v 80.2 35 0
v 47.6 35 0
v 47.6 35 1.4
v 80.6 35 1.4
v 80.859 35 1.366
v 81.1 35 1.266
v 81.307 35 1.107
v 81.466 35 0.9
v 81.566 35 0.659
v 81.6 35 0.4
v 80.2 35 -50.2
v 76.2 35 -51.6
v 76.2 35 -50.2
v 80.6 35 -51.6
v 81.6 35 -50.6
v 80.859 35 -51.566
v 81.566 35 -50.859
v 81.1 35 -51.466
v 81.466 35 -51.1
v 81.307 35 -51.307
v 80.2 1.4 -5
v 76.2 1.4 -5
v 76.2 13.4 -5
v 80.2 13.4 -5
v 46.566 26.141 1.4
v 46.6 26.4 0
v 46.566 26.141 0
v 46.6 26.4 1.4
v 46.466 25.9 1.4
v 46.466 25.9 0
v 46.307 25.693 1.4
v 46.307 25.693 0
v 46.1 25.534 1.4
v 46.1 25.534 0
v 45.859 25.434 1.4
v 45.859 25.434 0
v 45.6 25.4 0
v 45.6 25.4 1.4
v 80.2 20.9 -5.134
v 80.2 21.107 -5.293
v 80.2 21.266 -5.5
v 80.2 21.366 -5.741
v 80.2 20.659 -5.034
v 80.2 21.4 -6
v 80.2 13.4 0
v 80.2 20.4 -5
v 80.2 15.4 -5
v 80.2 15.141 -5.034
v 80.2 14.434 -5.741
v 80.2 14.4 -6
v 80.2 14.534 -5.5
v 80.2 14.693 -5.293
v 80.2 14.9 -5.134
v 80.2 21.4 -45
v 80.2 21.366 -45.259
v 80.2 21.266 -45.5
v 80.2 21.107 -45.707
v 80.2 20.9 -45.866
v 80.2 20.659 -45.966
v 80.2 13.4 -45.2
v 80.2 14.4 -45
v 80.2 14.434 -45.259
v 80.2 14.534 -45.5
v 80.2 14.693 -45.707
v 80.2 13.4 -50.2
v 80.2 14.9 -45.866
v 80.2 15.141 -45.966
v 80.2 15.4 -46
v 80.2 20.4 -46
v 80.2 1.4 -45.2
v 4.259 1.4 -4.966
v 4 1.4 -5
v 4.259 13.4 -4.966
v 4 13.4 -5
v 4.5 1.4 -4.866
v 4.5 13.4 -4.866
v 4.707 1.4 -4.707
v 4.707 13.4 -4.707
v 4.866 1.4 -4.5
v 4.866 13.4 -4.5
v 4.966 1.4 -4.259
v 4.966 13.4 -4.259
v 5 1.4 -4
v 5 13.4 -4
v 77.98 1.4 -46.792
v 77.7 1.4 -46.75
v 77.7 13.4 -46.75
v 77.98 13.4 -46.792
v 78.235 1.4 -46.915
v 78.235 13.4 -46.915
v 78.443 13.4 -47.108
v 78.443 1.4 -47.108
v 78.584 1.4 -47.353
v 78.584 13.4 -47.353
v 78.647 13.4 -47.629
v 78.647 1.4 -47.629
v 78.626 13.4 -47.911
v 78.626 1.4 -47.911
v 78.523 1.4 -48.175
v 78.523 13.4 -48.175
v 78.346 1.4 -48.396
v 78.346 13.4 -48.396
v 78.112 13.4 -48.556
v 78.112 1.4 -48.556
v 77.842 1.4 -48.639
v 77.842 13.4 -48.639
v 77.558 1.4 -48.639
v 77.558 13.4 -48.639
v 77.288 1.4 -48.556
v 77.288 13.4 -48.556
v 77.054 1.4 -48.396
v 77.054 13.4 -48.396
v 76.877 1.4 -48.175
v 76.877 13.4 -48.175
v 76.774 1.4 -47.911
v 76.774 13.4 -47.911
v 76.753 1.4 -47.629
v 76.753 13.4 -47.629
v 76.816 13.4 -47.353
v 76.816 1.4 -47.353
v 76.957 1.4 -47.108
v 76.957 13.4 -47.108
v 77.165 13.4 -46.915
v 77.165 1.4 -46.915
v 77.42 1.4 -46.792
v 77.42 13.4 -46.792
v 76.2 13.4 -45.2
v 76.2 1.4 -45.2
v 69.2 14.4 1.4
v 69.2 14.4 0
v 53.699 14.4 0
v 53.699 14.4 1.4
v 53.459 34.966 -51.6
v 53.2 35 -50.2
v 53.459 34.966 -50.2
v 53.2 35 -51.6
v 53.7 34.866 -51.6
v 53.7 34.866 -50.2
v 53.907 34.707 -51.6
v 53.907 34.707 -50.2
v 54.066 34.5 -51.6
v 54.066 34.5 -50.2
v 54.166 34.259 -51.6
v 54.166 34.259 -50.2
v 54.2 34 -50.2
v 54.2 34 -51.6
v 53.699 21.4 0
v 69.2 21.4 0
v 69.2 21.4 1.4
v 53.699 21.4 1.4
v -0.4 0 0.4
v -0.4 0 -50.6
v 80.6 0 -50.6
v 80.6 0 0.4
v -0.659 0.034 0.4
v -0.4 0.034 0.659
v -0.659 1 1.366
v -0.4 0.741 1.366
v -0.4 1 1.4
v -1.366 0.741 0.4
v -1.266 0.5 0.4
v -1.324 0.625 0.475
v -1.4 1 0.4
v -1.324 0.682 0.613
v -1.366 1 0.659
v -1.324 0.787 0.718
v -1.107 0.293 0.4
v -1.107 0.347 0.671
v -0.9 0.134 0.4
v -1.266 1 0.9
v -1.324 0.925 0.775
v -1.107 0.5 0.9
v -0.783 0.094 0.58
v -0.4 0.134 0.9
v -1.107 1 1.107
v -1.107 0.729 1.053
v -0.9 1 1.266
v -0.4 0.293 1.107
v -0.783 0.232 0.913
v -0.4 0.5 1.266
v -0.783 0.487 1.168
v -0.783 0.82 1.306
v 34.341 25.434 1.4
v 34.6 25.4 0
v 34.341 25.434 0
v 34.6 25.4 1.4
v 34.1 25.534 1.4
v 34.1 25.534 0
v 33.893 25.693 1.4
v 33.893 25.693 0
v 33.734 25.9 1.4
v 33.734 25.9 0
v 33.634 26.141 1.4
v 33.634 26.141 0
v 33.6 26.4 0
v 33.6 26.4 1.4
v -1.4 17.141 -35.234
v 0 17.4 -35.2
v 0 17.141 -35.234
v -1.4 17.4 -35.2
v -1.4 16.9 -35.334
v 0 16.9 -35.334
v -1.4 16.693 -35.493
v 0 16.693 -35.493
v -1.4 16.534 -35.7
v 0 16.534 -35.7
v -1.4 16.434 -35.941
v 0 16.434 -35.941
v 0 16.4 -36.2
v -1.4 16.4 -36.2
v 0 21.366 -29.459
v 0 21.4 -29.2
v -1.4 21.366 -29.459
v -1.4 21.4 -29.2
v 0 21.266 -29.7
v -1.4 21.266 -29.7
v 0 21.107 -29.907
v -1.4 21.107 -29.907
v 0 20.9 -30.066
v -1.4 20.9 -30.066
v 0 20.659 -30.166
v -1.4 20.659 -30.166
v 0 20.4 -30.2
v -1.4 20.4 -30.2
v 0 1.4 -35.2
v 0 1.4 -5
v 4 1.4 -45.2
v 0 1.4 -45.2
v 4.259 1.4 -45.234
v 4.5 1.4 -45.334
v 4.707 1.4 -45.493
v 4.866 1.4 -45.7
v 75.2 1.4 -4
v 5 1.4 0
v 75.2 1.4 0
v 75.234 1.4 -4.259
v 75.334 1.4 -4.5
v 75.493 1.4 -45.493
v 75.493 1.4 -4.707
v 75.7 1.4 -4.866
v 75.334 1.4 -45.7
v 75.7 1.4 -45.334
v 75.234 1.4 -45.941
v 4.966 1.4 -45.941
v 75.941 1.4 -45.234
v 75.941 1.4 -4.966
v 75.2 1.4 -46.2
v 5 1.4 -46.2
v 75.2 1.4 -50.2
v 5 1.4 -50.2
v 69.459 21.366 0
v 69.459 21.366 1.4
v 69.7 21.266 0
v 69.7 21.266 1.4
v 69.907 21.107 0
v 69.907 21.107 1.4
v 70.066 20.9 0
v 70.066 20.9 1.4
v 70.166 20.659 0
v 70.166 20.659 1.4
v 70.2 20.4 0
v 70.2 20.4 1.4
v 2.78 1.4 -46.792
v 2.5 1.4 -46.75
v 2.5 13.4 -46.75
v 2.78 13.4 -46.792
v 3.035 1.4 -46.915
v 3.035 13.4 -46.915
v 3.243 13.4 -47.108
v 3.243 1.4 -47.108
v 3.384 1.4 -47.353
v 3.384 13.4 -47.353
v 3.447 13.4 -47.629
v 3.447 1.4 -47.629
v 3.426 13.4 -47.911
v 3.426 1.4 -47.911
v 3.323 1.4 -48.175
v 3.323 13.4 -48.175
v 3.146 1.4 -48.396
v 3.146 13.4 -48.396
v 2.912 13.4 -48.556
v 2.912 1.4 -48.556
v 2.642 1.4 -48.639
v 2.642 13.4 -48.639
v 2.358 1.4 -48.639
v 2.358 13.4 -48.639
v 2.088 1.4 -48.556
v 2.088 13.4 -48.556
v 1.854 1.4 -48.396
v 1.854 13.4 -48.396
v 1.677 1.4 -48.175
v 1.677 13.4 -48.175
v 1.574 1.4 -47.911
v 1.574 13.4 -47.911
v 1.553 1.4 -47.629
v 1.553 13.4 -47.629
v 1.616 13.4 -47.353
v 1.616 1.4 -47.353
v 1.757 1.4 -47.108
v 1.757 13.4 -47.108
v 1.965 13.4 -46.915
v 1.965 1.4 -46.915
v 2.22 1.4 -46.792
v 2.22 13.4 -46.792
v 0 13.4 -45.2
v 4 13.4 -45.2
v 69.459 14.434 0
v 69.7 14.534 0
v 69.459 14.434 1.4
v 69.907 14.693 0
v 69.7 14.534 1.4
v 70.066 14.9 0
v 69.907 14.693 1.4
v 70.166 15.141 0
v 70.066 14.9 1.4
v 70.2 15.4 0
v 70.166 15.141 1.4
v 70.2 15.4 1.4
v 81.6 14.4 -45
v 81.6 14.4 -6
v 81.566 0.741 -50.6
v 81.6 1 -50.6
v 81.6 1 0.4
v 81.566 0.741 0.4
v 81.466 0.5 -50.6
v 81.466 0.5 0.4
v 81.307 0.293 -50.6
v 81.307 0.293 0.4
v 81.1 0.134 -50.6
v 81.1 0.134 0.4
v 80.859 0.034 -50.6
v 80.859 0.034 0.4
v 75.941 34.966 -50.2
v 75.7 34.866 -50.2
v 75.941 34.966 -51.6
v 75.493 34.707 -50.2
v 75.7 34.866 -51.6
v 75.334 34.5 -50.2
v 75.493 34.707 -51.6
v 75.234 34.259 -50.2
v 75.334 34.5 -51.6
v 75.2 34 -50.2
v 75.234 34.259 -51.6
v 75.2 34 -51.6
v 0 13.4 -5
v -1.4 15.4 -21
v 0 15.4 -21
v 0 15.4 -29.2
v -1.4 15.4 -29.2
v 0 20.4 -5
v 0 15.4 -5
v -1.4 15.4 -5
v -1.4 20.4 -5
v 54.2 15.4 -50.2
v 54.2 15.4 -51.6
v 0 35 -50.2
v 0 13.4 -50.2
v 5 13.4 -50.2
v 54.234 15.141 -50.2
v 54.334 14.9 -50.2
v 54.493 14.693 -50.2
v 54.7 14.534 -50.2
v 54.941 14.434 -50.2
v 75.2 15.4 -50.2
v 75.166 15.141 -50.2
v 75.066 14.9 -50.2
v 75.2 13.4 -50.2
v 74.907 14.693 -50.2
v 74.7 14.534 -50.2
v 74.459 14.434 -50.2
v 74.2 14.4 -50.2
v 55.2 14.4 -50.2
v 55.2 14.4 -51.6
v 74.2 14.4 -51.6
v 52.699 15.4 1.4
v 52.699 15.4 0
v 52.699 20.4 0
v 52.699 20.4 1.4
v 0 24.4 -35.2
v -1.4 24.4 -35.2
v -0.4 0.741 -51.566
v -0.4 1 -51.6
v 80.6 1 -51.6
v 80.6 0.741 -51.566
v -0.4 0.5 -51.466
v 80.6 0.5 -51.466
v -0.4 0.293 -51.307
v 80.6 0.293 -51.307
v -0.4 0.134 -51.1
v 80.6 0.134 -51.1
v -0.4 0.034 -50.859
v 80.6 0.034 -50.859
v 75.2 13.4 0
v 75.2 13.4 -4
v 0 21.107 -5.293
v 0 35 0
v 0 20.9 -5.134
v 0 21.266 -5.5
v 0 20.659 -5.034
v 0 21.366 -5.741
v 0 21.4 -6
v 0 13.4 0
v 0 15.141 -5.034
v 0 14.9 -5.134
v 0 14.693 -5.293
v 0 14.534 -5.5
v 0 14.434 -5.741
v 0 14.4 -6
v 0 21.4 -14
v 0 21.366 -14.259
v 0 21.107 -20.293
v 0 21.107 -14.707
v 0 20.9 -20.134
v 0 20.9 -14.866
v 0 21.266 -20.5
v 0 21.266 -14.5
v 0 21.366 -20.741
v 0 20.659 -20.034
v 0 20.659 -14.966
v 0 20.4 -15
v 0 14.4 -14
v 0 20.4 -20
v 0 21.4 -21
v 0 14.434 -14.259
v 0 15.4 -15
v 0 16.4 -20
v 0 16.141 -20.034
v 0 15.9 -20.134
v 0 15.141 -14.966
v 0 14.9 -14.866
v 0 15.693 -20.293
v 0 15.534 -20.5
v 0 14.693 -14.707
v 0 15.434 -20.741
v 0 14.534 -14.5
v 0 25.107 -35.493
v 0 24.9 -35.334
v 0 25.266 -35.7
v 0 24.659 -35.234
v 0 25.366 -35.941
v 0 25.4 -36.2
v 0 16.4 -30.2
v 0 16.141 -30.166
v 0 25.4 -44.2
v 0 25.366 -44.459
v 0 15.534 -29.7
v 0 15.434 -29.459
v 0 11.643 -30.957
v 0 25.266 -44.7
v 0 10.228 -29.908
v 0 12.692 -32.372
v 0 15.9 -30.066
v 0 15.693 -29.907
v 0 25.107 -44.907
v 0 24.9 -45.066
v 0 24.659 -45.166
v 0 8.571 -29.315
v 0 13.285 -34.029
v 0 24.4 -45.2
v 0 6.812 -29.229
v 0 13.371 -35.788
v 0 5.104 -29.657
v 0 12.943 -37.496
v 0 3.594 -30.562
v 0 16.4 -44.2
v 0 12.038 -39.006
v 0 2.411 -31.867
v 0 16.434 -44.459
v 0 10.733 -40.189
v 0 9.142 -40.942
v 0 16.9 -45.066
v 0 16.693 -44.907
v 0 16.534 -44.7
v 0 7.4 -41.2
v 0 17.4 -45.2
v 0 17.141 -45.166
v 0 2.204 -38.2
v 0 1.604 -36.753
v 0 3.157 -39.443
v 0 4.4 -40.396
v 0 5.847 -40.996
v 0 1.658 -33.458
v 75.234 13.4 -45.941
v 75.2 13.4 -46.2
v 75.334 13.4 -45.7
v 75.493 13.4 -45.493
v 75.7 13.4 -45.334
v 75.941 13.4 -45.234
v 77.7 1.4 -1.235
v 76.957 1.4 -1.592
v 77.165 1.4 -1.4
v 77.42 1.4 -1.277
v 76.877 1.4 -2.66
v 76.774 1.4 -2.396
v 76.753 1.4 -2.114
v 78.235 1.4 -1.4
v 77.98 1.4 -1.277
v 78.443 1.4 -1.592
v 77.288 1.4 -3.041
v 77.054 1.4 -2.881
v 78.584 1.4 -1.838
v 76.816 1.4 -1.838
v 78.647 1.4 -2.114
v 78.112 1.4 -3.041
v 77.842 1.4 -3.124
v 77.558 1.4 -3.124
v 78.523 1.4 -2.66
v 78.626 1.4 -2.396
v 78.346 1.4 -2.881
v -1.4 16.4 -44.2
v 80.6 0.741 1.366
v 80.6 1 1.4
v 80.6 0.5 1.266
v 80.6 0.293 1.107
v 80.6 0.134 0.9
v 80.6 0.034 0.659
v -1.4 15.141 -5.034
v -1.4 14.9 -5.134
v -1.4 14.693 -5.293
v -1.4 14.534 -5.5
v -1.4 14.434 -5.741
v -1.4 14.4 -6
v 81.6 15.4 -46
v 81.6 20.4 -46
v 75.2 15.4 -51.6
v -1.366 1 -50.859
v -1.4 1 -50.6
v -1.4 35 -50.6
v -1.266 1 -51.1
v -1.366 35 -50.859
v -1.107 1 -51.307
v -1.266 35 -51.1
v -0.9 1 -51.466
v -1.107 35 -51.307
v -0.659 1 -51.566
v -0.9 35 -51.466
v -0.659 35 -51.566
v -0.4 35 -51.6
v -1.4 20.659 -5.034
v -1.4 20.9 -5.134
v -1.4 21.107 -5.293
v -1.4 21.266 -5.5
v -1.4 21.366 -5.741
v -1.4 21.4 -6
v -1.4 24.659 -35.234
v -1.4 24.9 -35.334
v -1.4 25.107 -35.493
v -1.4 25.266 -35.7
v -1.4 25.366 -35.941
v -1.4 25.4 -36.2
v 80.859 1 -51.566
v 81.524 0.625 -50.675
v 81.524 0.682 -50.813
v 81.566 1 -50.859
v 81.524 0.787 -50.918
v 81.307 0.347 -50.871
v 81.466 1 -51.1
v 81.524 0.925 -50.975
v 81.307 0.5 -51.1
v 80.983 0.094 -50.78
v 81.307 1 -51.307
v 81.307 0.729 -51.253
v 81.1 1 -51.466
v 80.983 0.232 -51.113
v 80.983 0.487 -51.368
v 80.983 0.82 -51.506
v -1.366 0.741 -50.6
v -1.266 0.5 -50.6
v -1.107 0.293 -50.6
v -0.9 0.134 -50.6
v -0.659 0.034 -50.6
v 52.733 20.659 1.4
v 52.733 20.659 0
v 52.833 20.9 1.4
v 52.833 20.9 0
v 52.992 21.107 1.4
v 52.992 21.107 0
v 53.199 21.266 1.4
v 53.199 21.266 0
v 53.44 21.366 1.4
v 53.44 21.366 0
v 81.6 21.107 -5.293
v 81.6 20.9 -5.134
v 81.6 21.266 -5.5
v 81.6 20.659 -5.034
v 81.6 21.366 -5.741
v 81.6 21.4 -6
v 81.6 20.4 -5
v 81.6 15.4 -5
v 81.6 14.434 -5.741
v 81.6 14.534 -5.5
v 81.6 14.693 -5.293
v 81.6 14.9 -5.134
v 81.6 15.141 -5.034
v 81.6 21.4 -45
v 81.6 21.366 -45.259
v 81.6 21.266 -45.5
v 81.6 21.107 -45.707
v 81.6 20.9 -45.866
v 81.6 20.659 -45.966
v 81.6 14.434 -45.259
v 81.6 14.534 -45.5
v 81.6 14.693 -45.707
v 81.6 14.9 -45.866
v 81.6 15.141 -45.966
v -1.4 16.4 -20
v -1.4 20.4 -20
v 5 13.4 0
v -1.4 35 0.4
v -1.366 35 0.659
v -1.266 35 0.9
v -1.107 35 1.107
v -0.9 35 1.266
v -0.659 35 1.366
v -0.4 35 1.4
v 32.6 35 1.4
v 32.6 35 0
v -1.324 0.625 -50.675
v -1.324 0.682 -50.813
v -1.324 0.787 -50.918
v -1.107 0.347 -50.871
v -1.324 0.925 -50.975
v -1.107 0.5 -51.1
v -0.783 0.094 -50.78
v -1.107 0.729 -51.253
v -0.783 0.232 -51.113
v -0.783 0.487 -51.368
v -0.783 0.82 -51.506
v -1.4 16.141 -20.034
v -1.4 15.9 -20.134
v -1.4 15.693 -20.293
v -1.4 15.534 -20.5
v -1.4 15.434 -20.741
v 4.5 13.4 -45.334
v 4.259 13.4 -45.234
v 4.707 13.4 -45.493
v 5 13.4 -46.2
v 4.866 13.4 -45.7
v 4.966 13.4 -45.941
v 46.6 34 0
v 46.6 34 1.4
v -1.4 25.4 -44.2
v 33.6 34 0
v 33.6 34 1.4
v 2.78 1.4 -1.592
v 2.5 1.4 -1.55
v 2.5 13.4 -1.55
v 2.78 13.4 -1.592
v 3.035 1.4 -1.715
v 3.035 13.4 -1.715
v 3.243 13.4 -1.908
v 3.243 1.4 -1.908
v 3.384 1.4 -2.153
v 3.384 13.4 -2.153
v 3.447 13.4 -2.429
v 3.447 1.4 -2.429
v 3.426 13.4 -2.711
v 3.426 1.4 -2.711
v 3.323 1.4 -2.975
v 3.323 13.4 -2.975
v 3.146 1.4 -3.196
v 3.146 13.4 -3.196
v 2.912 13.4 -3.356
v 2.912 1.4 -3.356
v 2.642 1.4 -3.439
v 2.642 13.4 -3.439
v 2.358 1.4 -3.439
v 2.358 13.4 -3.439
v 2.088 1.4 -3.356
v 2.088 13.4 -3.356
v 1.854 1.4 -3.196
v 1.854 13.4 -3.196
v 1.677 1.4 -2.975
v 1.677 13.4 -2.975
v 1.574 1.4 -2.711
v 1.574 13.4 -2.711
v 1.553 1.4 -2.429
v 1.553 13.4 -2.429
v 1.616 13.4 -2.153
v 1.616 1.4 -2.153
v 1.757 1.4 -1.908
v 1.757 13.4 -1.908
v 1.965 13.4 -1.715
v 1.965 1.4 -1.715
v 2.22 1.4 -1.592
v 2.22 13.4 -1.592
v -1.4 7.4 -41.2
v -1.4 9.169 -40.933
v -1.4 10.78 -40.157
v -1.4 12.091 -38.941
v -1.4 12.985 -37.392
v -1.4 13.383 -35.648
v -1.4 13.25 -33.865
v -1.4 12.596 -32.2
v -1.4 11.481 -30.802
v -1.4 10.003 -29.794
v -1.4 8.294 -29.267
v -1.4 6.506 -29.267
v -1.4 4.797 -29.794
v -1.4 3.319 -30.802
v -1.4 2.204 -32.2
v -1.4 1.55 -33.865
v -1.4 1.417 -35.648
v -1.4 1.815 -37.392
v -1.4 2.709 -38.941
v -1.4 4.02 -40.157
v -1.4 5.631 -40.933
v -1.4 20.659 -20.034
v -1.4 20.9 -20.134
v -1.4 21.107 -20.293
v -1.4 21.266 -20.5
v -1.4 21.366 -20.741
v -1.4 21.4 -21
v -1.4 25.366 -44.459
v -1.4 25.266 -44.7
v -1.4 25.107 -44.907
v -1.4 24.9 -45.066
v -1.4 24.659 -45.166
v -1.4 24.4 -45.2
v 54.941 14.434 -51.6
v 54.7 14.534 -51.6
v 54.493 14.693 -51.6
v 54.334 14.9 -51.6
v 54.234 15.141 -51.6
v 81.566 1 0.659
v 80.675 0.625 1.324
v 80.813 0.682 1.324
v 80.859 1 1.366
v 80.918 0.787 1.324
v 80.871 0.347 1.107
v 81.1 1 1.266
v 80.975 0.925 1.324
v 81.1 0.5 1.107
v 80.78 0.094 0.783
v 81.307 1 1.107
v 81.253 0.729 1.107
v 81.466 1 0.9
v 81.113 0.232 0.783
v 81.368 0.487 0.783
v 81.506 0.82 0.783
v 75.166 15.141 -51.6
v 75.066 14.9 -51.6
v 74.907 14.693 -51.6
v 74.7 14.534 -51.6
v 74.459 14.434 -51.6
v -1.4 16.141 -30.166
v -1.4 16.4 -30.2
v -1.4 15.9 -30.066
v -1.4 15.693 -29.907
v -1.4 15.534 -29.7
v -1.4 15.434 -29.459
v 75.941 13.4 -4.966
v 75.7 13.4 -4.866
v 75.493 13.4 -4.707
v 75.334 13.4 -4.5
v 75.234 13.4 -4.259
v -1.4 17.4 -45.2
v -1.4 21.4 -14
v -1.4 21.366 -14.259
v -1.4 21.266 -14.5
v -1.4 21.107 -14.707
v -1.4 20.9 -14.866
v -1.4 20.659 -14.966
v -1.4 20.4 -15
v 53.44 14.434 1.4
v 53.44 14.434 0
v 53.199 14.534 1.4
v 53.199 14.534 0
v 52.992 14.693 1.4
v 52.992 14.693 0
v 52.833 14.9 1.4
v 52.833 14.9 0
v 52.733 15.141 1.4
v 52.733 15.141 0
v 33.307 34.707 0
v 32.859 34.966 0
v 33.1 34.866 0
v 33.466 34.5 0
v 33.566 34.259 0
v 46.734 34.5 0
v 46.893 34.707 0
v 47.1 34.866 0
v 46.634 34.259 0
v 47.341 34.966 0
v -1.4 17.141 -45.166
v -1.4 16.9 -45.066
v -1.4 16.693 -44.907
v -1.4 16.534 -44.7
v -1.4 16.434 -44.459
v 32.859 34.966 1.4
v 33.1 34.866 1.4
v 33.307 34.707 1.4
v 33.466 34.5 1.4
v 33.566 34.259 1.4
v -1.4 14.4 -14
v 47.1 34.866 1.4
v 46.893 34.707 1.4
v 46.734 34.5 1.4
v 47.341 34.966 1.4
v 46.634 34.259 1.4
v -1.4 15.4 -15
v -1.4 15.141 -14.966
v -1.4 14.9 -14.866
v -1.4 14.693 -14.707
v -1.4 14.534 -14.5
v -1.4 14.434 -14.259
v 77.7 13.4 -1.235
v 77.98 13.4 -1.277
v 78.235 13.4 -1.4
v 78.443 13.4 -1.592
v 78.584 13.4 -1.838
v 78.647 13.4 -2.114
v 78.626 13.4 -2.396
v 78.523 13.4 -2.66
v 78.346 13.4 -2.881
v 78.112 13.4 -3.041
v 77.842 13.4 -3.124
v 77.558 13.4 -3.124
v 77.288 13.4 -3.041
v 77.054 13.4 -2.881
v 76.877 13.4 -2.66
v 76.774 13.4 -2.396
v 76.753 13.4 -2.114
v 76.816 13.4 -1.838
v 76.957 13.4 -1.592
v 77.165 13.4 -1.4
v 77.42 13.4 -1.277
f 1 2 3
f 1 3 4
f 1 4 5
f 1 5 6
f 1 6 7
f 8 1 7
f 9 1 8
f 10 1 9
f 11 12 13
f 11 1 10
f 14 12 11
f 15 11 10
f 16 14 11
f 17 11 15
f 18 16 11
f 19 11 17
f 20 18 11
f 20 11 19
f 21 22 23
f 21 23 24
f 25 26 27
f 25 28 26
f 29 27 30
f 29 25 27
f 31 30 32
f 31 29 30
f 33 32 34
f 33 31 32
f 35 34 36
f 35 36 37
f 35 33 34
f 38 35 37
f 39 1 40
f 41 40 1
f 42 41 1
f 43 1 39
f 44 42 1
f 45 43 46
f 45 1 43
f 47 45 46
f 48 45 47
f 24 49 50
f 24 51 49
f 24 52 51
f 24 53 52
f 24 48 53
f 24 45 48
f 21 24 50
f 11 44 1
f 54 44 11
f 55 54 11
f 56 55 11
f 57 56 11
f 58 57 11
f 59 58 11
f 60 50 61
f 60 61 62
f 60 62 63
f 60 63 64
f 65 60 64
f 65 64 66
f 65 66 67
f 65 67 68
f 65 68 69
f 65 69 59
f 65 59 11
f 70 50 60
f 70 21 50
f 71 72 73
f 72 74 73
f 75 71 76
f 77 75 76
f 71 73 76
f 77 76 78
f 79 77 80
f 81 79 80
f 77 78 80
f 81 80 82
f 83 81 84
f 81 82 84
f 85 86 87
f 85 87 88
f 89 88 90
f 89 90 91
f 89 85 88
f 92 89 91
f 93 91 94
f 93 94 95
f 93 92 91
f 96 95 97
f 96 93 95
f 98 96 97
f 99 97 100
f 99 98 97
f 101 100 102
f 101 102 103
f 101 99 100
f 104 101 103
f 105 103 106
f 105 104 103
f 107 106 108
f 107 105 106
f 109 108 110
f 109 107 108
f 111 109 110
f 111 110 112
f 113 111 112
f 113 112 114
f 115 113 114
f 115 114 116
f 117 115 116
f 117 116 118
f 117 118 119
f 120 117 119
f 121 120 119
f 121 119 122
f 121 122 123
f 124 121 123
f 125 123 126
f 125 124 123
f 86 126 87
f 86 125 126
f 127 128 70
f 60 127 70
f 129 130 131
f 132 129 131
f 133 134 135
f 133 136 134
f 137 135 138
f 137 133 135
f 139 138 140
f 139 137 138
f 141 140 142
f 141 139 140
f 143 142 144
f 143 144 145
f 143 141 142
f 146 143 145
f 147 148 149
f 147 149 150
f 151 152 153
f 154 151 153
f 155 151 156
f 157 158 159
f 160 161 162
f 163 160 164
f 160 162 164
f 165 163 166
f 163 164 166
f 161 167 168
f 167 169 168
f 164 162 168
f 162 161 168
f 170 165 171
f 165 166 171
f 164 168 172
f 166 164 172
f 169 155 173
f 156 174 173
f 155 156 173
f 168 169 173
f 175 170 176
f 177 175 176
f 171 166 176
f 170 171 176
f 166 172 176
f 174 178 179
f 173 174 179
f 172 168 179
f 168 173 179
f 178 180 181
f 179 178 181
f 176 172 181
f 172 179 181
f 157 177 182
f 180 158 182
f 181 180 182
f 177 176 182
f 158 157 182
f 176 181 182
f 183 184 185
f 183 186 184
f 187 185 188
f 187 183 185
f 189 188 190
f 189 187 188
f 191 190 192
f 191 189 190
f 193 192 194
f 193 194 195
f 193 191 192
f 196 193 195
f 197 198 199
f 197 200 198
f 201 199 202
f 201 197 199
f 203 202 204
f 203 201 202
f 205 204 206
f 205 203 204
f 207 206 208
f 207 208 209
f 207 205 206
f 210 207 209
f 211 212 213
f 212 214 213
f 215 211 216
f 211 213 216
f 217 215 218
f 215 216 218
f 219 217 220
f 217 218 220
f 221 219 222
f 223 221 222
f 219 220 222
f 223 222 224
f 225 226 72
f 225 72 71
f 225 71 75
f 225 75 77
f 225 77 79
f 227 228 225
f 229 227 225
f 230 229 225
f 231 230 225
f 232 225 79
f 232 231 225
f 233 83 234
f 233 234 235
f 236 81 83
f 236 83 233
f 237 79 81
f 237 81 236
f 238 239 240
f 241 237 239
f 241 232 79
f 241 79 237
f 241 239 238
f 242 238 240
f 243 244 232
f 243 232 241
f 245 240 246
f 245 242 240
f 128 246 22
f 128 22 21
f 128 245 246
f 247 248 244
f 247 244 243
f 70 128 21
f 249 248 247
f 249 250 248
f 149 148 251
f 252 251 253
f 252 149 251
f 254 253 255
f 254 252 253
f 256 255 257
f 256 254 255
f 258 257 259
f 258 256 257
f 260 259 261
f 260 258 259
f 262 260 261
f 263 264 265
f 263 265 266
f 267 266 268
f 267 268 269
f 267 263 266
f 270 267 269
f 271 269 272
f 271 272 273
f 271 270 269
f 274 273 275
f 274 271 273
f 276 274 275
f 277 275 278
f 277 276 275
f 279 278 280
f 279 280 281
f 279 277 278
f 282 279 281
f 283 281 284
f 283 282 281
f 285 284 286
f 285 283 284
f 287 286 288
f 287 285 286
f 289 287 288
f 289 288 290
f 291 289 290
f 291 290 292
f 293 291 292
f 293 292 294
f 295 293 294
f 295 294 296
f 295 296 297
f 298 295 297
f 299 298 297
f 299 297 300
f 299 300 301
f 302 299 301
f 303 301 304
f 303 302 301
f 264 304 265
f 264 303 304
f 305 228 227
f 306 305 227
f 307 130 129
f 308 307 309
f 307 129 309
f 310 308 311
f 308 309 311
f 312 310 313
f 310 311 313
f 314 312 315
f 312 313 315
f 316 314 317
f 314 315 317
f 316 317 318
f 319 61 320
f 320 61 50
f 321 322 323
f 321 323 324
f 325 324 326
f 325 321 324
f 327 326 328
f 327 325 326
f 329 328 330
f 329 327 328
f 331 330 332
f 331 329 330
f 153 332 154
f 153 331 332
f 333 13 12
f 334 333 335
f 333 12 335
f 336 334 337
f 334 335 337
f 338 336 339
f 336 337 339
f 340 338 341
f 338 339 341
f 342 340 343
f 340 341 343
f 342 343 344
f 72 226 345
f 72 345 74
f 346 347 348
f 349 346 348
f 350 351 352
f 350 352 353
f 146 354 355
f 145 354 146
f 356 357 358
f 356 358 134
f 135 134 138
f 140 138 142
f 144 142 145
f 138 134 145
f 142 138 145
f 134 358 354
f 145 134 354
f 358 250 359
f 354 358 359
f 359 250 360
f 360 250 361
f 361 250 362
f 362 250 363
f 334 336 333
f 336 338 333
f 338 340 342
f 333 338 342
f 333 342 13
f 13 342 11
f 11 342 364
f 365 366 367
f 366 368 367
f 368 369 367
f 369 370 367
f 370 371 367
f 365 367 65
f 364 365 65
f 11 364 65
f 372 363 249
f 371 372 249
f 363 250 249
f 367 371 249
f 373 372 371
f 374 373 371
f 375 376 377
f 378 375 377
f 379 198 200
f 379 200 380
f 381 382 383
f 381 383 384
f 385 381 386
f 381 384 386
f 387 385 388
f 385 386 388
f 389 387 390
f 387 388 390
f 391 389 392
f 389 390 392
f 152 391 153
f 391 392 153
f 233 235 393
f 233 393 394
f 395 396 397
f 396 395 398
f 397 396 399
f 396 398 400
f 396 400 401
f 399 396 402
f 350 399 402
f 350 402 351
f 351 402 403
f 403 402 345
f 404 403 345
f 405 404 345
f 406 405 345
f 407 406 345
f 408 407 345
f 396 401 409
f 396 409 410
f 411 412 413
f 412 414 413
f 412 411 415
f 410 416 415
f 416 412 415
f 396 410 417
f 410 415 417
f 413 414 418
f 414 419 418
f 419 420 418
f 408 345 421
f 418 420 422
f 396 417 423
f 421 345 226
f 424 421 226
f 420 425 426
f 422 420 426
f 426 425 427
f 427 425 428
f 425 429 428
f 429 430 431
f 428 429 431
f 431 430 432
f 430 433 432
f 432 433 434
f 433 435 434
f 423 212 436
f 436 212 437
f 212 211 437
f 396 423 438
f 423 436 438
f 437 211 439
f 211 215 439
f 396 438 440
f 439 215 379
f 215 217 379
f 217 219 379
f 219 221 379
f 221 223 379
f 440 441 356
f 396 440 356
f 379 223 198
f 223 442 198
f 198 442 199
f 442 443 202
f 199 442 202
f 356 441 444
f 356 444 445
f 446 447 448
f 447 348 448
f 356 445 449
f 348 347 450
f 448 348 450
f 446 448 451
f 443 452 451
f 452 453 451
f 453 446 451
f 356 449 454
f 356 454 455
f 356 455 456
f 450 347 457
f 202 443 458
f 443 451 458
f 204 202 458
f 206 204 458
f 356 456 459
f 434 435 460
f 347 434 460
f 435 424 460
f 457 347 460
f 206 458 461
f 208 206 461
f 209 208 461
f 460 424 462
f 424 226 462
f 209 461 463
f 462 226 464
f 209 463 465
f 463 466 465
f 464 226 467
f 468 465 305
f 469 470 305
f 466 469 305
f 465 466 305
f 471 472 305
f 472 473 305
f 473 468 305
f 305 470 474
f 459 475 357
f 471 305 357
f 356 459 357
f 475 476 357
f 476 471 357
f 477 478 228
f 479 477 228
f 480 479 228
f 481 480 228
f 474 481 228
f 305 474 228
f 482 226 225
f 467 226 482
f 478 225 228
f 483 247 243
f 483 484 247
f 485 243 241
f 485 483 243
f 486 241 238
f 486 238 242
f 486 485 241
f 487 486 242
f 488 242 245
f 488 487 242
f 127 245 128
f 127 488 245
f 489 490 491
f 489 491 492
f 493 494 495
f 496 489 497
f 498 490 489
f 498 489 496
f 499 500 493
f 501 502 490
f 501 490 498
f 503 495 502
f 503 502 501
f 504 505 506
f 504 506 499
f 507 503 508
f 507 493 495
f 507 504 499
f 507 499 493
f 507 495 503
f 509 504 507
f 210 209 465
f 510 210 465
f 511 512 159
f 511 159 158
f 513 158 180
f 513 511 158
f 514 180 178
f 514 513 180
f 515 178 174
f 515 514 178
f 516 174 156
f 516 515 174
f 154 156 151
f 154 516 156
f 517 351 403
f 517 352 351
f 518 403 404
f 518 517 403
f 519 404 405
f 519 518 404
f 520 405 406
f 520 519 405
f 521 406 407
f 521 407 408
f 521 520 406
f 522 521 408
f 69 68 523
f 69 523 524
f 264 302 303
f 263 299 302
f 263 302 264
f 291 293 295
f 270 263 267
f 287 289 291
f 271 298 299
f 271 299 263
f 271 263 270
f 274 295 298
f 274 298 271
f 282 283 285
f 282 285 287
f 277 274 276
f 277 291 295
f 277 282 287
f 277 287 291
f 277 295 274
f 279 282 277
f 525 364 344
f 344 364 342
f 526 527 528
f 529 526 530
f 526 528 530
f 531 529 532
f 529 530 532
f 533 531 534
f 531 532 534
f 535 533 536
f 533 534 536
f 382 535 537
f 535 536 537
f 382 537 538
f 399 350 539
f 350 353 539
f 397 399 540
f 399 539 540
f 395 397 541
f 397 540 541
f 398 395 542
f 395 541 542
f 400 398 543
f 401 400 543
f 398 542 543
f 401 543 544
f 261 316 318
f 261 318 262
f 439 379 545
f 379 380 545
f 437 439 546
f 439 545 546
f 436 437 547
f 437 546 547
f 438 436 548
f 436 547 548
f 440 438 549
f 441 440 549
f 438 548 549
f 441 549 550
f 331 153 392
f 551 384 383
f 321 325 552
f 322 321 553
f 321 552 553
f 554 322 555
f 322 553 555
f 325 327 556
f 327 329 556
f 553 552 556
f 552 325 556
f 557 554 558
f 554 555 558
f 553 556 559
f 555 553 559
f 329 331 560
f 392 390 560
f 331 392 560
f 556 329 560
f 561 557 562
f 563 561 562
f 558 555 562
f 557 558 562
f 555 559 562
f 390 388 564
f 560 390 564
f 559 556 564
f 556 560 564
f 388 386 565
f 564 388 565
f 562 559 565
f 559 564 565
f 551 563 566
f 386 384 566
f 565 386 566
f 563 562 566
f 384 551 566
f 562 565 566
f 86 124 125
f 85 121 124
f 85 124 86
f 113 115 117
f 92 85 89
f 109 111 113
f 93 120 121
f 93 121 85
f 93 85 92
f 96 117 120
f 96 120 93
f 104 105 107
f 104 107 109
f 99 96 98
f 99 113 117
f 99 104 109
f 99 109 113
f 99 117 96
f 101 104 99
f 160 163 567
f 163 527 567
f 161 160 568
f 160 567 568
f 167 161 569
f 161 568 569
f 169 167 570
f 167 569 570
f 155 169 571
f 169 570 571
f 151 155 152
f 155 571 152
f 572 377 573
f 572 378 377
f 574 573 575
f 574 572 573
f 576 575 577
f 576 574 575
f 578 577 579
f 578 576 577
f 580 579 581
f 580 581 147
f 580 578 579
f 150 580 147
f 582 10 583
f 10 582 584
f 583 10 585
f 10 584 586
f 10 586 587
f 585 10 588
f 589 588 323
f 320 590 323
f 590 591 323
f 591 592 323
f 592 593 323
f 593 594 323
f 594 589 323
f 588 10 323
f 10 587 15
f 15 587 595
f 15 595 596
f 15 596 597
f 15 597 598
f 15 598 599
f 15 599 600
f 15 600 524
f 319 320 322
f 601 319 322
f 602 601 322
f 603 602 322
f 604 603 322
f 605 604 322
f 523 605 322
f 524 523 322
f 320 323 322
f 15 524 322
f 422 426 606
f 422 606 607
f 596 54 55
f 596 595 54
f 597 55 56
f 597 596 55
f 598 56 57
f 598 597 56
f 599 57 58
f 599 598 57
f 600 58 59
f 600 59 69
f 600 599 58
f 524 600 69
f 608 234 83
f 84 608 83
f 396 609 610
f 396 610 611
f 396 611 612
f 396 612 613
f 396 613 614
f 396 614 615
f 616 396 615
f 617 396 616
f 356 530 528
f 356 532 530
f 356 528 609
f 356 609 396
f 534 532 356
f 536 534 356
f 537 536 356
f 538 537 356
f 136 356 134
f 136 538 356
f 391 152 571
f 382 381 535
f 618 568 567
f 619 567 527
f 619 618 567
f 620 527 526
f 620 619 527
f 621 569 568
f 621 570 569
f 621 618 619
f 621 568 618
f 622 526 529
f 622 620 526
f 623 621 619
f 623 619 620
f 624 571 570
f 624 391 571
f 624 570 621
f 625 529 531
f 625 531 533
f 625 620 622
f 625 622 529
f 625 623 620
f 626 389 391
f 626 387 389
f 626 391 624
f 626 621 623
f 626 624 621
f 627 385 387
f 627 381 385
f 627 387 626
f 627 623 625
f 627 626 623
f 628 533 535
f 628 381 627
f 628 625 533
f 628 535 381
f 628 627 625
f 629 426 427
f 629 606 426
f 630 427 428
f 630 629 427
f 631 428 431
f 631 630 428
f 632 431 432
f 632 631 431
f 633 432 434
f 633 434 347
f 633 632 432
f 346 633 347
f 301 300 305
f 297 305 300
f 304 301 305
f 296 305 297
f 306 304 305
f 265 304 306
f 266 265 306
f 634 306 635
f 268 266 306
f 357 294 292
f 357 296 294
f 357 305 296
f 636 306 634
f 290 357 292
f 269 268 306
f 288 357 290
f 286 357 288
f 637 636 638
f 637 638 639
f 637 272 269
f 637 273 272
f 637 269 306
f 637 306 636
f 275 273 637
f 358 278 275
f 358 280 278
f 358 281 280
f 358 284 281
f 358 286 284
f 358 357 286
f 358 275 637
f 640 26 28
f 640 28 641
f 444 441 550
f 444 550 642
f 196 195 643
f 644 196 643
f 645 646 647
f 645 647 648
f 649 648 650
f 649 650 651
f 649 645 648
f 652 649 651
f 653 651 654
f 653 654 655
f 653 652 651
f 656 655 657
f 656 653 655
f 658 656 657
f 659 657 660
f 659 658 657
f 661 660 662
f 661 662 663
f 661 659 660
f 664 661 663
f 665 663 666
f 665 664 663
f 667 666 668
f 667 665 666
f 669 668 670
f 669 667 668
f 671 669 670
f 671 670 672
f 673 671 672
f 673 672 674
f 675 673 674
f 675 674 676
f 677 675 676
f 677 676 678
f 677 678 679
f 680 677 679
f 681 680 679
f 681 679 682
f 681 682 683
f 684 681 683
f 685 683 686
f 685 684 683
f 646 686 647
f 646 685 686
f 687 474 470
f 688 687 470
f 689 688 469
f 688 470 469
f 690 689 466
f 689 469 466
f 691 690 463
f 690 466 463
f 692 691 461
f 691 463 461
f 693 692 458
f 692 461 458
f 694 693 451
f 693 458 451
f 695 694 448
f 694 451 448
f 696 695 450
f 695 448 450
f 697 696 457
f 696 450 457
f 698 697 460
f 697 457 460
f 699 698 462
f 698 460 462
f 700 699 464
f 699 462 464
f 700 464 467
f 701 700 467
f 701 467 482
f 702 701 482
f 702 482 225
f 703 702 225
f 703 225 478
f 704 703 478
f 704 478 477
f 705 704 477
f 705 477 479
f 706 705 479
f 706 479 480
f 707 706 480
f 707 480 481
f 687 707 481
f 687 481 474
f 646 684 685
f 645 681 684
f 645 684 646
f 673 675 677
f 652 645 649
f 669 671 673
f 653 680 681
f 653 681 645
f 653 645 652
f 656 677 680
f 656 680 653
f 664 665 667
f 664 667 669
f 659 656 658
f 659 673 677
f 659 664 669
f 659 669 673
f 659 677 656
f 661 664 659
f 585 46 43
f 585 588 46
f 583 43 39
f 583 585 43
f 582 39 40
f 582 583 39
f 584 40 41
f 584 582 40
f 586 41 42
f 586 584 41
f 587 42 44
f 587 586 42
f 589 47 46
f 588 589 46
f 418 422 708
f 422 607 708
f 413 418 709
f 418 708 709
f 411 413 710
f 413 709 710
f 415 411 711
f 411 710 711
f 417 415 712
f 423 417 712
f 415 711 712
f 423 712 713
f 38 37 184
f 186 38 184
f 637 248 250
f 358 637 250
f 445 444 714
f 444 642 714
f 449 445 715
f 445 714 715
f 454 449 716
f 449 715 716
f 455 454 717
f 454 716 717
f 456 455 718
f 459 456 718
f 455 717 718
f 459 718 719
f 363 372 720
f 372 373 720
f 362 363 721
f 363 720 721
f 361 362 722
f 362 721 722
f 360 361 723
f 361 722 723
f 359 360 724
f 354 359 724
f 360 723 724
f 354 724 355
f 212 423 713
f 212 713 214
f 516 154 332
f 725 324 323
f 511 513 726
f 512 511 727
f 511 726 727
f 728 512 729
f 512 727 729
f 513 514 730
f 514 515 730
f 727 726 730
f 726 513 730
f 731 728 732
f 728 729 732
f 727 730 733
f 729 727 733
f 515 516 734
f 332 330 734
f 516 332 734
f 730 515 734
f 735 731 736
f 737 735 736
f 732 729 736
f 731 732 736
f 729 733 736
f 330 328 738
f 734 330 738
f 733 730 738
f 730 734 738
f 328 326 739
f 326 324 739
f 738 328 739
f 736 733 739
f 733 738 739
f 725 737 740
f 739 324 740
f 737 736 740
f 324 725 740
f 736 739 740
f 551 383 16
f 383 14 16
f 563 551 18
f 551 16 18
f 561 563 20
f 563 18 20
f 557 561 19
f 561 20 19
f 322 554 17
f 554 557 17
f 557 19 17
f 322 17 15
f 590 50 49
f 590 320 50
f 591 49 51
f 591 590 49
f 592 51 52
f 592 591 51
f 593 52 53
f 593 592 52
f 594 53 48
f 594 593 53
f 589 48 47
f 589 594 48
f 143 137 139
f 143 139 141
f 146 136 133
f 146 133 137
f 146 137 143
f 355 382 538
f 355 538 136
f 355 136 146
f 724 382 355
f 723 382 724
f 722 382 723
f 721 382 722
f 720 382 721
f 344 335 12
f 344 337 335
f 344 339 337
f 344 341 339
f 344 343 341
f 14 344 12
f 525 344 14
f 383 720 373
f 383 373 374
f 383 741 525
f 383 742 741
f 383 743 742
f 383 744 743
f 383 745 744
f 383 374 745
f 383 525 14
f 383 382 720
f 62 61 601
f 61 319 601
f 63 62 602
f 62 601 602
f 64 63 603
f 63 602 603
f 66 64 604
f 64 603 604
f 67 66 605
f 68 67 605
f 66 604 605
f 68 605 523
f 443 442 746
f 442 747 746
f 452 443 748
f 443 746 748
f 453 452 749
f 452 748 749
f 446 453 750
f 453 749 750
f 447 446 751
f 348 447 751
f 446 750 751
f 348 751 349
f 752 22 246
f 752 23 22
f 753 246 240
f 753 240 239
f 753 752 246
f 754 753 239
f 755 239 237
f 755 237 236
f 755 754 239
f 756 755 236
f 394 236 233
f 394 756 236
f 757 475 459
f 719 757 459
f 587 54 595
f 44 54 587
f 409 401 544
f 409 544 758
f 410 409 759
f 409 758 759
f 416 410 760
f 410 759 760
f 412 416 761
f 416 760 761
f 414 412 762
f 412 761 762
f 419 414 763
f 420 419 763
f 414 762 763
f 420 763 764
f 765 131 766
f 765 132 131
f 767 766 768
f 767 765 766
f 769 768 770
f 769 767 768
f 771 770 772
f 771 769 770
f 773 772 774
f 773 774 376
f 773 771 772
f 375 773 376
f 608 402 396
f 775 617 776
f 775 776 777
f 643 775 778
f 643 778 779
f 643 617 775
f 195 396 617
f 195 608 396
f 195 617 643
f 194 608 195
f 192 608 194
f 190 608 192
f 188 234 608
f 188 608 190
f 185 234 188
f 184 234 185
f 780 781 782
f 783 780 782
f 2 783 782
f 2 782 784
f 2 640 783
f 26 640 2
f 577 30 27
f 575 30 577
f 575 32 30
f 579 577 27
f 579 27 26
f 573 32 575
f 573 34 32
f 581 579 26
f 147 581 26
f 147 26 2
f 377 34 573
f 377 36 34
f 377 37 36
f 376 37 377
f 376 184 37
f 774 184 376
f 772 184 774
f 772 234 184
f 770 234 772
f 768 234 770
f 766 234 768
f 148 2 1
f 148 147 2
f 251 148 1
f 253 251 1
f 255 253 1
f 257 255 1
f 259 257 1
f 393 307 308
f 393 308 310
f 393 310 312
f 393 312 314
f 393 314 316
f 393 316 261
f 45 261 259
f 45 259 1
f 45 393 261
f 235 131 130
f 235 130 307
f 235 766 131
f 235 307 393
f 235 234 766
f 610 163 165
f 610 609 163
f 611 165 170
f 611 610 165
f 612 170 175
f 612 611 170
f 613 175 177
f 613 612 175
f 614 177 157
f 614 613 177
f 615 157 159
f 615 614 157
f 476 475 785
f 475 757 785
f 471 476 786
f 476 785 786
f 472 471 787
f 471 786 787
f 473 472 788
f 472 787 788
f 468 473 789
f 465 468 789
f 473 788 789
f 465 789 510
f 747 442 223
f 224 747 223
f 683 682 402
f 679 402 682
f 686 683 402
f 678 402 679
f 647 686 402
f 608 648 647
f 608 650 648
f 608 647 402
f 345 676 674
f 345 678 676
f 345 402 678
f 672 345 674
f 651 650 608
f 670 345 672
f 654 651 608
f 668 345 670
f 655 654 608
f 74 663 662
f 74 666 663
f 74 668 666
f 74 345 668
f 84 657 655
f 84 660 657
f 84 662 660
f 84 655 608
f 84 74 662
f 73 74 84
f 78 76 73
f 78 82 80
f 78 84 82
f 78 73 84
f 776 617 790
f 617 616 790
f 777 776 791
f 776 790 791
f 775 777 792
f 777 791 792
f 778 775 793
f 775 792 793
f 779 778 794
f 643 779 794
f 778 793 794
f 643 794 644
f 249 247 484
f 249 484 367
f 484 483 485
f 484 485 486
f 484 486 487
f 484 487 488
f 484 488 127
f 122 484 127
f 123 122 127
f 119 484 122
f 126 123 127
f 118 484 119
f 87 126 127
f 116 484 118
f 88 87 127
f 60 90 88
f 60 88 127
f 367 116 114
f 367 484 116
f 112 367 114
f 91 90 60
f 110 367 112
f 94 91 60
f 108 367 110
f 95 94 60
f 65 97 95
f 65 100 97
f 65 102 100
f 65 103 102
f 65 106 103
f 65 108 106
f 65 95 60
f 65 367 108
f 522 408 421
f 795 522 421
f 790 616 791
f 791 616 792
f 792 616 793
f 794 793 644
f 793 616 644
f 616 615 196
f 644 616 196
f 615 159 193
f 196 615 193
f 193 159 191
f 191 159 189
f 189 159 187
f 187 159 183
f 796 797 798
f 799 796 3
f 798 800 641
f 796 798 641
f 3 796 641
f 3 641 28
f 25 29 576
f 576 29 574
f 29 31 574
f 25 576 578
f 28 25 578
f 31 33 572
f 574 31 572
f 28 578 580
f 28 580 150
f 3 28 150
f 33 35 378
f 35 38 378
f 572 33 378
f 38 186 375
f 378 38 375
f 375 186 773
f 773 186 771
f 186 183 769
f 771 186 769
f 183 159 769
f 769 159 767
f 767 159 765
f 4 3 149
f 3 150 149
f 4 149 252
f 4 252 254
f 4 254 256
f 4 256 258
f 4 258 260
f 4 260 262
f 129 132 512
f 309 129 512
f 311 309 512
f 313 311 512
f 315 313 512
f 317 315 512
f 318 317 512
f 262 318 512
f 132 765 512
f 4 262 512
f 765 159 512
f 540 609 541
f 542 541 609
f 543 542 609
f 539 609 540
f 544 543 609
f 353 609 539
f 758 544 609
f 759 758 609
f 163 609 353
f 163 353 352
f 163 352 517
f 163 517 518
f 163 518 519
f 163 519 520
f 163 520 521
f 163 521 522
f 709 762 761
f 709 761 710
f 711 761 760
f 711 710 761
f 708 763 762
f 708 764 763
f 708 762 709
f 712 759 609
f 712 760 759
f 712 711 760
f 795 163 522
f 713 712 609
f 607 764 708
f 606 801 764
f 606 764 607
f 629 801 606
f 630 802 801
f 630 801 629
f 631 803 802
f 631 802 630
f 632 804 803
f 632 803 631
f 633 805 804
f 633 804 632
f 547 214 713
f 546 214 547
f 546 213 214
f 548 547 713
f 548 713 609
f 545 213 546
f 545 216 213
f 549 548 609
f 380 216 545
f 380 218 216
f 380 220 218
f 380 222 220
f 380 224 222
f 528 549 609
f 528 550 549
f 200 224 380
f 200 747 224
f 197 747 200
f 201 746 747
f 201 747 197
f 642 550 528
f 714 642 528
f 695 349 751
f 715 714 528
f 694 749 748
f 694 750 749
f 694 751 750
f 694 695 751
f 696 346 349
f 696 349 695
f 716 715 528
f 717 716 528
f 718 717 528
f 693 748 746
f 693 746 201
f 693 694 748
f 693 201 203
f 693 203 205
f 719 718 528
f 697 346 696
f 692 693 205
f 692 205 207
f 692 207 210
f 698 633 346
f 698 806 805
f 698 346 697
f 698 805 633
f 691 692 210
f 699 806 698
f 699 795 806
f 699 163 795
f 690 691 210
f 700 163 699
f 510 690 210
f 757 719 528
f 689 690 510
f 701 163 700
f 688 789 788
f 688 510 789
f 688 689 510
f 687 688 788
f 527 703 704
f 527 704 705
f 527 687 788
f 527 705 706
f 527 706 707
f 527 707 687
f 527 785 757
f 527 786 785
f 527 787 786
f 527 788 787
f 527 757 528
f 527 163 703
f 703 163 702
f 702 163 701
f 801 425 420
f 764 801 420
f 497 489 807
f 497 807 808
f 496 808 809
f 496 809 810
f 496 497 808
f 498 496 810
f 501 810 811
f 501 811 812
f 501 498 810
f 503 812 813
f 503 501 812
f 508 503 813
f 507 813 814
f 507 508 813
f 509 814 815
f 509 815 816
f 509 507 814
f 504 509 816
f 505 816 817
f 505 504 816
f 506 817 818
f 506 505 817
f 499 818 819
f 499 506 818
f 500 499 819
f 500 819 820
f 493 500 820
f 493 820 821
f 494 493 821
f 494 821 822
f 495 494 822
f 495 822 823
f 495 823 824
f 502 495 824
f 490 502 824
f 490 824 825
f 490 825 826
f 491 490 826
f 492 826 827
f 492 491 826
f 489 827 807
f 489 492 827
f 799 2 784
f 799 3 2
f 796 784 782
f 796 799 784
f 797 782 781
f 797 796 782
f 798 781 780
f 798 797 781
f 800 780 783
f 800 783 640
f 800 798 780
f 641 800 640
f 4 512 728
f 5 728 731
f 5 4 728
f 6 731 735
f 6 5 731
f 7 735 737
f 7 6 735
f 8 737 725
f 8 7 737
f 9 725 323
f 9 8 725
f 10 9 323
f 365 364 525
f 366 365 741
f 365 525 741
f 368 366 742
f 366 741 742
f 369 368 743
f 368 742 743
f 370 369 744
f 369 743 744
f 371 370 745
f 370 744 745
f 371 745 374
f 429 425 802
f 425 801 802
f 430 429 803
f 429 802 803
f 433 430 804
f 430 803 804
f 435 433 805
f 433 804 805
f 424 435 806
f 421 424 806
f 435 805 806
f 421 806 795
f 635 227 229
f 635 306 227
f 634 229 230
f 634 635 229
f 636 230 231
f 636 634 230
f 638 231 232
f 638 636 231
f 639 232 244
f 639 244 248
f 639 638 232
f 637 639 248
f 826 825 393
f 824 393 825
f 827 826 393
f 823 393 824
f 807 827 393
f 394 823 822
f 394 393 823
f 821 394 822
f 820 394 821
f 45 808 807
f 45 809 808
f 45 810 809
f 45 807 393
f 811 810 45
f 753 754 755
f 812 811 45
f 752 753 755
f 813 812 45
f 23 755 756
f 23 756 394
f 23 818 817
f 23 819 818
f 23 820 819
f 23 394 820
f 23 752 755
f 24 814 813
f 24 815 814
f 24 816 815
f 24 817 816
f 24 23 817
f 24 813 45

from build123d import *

# Parameters (mm, degrees)
SKETCH_1_W          = 83
SKETCH_1_H          = 53
SKETCH_1_W_2        = 80.2
SKETCH_1_H_2        = 50.2
EXTRUDE_1_DEPTH     = 35
SKETCH_3_W          = 80.2
SKETCH_3_H          = 50.2
EXTRUDE_2_DEPTH     = 1.4
SKETCH_4_W          = 5
SKETCH_4_H          = 5
SKETCH_4_R          = 0.95
EXTRUDE_3_DEPTH     = 12
SKETCH_5_W          = 41
SKETCH_5_H          = 7
CUT_EXTRUDE_1_DEPTH = 10
SKETCH_6_W          = 10
SKETCH_6_H          = 7
SKETCH_6_H_2        = 9
SKETCH_6_W_2        = 10.2
SKETCH_6_H_3        = 6
CUT_EXTRUDE_2_DEPTH = 10
SKETCH_8_W          = 21
SKETCH_8_H          = 21
CUT_EXTRUDE_4_DEPTH = 10
SKETCH_9_W          = 13
SKETCH_9_H          = 9.6
CUT_EXTRUDE_5_DEPTH = 10
FILLET_1_R          = 1
FILLET_2_R          = 1
SKETCH_11_W         = 17.500857193
SKETCH_11_H         = 7
CUT_EXTRUDE_7_DEPTH = 10
FILLET_5_R          = 1
SKETCH_13_R         = 6
CUT_EXTRUDE_8_DEPTH = 10
FILLET_6_R          = 1
FILLET_7_R          = 1


with BuildPart() as part:
    # 草图1 → 凸台-拉伸1 (new body)
    with BuildSketch(Plane(origin=(0, 0, 0), x_dir=(1, 0, 0), z_dir=(0, 1, 0))):
        with Locations((40.1, 25.1)):
            Rectangle(SKETCH_1_W, SKETCH_1_H)
        with Locations((40.1, 25.1)):
            Rectangle(SKETCH_1_W_2, SKETCH_1_H_2, mode=Mode.SUBTRACT)
    extrude(amount=EXTRUDE_1_DEPTH)

    # 草图3 → 凸台-拉伸2 (add)
    with BuildSketch(Plane(origin=(0, 0, 0), x_dir=(1, 0, 0), z_dir=(0, 1, 0))):
        with Locations((40.1, 25.1)):
            Rectangle(SKETCH_3_W, SKETCH_3_H)
    extrude(amount=EXTRUDE_2_DEPTH)

    # 草图4 → 凸台-拉伸3 (add)
    # profile 1 of 4: a face of its own
    with BuildSketch(Plane(origin=(0, 1.4, 0), x_dir=(1, 0, 0), z_dir=(0, 1, 0))):
        with Locations((2.5, 47.7)):
            Rectangle(SKETCH_4_W, SKETCH_4_H)
        with Locations(Location((2.5, 47.7, 0), (0, 0, 270))):
            Circle(SKETCH_4_R, mode=Mode.SUBTRACT)
    # profile 2 of 4: a face of its own
    with BuildSketch(Plane(origin=(0, 1.4, 0), x_dir=(1, 0, 0), z_dir=(0, 1, 0))):
        with Locations((2.5, 2.5)):
            Rectangle(SKETCH_4_W, SKETCH_4_H)
        with Locations(Location((2.5, 2.5, 0), (0, 0, 270))):
            Circle(SKETCH_4_R, mode=Mode.SUBTRACT)
    # profile 3 of 4: a face of its own
    with BuildSketch(Plane(origin=(0, 1.4, 0), x_dir=(1, 0, 0), z_dir=(0, 1, 0))):
        with Locations((77.7, 47.7)):
            Rectangle(SKETCH_4_W, SKETCH_4_H)
        with Locations(Location((77.7, 47.7, 0), (0, 0, 270))):
            Circle(SKETCH_4_R, mode=Mode.SUBTRACT)
    # profile 4 of 4: a face of its own
    with BuildSketch(Plane(origin=(0, 1.4, 0), x_dir=(1, 0, 0), z_dir=(0, 1, 0))):
        with Locations((77.7, 2.5)):
            Rectangle(SKETCH_4_W, SKETCH_4_H)
        with Locations(Location((77.7, 2.184711345, 0), (0, 0, 270))):
            Circle(SKETCH_4_R, mode=Mode.SUBTRACT)
    extrude(amount=EXTRUDE_3_DEPTH)

    # 草图5 → 切除-拉伸1 (cut)
    with BuildSketch(Plane.ZY.offset(-80.2)):
        with Locations((-25.5, 17.9)):
            Rectangle(SKETCH_5_W, SKETCH_5_H)
    extrude(amount=-CUT_EXTRUDE_1_DEPTH, mode=Mode.SUBTRACT)

    # 草图6 → 切除-拉伸2 (cut)
    with BuildSketch(Plane(origin=(0, 0, 0), x_dir=(0, 0, -1), z_dir=(1, 0, 0))):
        with Locations((10, 17.9)):
            Rectangle(SKETCH_6_W, SKETCH_6_H)
        with Locations((40.2, 20.9)):
            Rectangle(SKETCH_6_W, SKETCH_6_H_2)
        with Locations((25.1, 18.4)):
            Rectangle(SKETCH_6_W_2, SKETCH_6_H_3)
    extrude(amount=-CUT_EXTRUDE_2_DEPTH, mode=Mode.SUBTRACT)

    # 草图8 → 切除-拉伸4 (cut)
    with BuildSketch(Plane.XY.offset(-50.2)):
        with Locations((64.7, 24.9)):
            Rectangle(SKETCH_8_W, SKETCH_8_H)
    extrude(amount=-CUT_EXTRUDE_4_DEPTH, mode=Mode.SUBTRACT)

    # 草图9 → 切除-拉伸5 (cut)
    with BuildSketch(Plane(origin=(0, 0, 0), x_dir=(-1, 0, 0), z_dir=(0, 0, -1))):
        with Locations((-40.1, 30.2)):
            Rectangle(SKETCH_9_W, SKETCH_9_H)
    extrude(amount=-CUT_EXTRUDE_5_DEPTH, mode=Mode.SUBTRACT)

    # 圆角1
    fillet_1_edges = [part.edges().sort_by_distance(p)[0] for p in [
        (80.9, 21.4, -5),
        (80.9, 14.4, -5),
        (80.9, 14.4, -46),
        (80.9, 21.4, -46),
        (-0.7, 14.4, -5),
        (-0.7, 21.4, -5),
        (-0.7, 21.4, -15),
        (-0.7, 14.4, -15),
        (-0.7, 25.4, -45.2),
        (-0.7, 16.4, -45.2),
        (-0.7, 16.4, -35.2),
        (-0.7, 25.4, -35.2),
        (-0.7, 15.4, -20),
        (-0.7, 21.4, -20),
        (-0.7, 15.4, -30.2),
        (75.2, 14.4, -50.9),
        (54.2, 14.4, -50.9),
        (46.6, 25.4, 0.7),
        (33.6, 25.4, 0.7),
        (5, 7.4, -5),
        (5, 7.4, -45.2),
        (75.2, 7.4, -45.2),
        (75.2, 7.4, -5),
    ]]
    fillet(fillet_1_edges, radius=FILLET_1_R)

    # 圆角2
    fillet_2_edges = [part.edges().sort_by_distance(p)[0] for p in [
        (40.1, 0, -51.6),
        (81.6, 0, -25.1),
        (40.1, 0, 1.4),
        (-1.4, 0, -25.1),
        (-1.4, 17.5, -51.6),
        (81.6, 17.5, -51.6),
        (81.6, 17.5, 1.4),
        (-1.4, 17.5, 1.4),
    ]]
    fillet(fillet_2_edges, radius=FILLET_2_R)

    # 草图11 → 切除-拉伸7 (cut)
    with BuildSketch(Plane(origin=(0, 0, 0), x_dir=(-1, 0, 0), z_dir=(0, 0, -1))):
        with Locations((-61.449571404, 17.9)):
            Rectangle(SKETCH_11_W, SKETCH_11_H)
    extrude(amount=-CUT_EXTRUDE_7_DEPTH, mode=Mode.SUBTRACT)

    # 圆角5
    fillet_5_edges = [part.edges().sort_by_distance(p)[0] for p in [
        (70.2, 14.4, 0.7),
        (70.2, 21.4, 0.7),
        (52.699142807, 21.4, 0.7),
        (52.699142807, 14.4, 0.7),
    ]]
    fillet(fillet_5_edges, radius=FILLET_5_R)

    # 草图13 → 切除-拉伸8 (cut)
    with BuildSketch(Plane(origin=(0, 0, 0), x_dir=(0, 0, -1), z_dir=(1, 0, 0))):
        with Locations((35.2, 7.4)):
            Circle(SKETCH_13_R)
    extrude(amount=-CUT_EXTRUDE_8_DEPTH, mode=Mode.SUBTRACT)

    # 圆角6
    fillet_6_edges = [part.edges().sort_by_distance(p)[0] for p in [
        (-0.7, 21.4, -30.2),
    ]]
    fillet(fillet_6_edges, radius=FILLET_6_R)

    # 圆角7
    fillet_7_edges = [part.edges().sort_by_distance(p)[0] for p in [
        (75.2, 35, -50.9),
        (54.2, 35, -50.9),
        (46.6, 35, 0.7),
        (33.6, 35, 0.7),
    ]]
    fillet(fillet_7_edges, radius=FILLET_7_R)


solid = part.part
